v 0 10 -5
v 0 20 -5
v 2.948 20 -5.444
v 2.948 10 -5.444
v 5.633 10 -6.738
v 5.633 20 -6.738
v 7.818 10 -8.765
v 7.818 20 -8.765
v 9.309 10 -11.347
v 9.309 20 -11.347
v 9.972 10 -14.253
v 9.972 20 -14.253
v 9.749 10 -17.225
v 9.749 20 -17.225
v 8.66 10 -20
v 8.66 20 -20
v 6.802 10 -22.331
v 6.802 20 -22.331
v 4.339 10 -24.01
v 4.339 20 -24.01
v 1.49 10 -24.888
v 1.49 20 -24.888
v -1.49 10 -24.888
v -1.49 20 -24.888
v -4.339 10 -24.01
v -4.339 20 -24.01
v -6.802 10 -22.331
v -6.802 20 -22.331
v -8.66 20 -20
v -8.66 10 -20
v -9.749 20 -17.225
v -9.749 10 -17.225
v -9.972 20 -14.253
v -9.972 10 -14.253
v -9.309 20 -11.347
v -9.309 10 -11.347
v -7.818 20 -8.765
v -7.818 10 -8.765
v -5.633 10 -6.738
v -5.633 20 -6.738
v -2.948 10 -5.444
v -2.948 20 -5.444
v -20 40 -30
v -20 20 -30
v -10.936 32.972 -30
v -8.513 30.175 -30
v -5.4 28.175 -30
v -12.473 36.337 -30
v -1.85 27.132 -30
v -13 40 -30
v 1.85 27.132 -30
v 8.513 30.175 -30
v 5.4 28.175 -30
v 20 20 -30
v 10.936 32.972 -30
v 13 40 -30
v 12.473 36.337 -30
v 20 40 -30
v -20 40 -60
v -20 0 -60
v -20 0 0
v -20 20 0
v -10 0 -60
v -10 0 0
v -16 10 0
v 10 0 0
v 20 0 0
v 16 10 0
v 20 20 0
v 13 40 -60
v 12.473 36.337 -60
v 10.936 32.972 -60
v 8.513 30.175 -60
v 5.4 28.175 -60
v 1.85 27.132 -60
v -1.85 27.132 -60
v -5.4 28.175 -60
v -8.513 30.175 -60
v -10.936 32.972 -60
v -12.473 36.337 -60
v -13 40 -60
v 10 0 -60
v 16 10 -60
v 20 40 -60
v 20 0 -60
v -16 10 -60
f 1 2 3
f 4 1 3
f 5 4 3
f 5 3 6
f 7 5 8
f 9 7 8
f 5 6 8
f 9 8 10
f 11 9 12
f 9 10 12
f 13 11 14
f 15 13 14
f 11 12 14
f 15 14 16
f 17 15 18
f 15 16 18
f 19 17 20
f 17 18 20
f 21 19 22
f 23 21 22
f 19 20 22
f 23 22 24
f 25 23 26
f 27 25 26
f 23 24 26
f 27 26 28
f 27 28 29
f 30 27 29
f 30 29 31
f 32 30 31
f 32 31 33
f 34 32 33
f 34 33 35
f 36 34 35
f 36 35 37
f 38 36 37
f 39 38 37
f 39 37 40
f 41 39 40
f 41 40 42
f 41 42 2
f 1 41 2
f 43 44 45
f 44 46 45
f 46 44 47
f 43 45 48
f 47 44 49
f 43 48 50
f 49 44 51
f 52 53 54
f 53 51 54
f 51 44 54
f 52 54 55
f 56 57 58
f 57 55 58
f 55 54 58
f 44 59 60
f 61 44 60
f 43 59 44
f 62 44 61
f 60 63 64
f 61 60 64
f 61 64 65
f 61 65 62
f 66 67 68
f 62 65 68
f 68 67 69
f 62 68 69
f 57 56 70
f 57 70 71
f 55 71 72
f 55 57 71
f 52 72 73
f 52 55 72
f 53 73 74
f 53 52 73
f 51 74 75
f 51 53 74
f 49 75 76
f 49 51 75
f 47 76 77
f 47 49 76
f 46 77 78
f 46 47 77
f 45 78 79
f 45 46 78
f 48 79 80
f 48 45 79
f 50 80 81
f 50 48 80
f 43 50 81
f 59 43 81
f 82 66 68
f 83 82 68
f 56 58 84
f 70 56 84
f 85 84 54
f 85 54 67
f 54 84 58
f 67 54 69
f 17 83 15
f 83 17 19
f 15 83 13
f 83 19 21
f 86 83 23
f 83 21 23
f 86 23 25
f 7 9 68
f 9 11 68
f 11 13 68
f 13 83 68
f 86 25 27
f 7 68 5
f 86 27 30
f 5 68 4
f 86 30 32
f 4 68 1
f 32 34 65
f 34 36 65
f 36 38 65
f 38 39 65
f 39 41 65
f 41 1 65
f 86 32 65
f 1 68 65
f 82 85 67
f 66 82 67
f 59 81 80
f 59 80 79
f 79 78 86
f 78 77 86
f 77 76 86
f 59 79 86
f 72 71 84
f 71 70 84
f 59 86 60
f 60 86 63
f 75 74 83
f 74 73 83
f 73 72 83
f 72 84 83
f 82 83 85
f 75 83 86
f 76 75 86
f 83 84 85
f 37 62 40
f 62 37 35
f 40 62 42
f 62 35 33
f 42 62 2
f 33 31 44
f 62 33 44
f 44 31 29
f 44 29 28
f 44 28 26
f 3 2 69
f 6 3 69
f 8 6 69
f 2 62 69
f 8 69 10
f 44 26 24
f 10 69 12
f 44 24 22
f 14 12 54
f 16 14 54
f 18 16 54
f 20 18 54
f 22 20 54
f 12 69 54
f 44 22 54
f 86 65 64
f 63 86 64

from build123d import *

# Parameters (mm, degrees)
EXTRUDE_1_DEPTH     = 20
CUT_EXTRUDE_2_DEPTH = 75.833147735
SKETCH_3_R          = 10
CUT_EXTRUDE_3_DEPTH = 67.332495807
CUT_EXTRUDE_4_DEPTH = 54.851648071


with BuildPart() as part:
    # 草图1 → 凸台-拉伸1 (new, symmetric)
    with BuildSketch(Plane(origin=(0, 0, 0), x_dir=(0, 0, -1), z_dir=(1, 0, 0))):
        Polygon((0, 0), (0, 20), (30, 20), (30, 40), (60, 40), (60, 0), align=None)
    extrude(amount=EXTRUDE_1_DEPTH, both=True)

    # 草图2 → 切除-拉伸2 (cut, through all)
    with BuildSketch(Plane.XY):
        Polygon((10, 0), (16, 10), (-16, 10), (-10, 0), align=None)
    extrude(amount=-CUT_EXTRUDE_2_DEPTH, mode=Mode.SUBTRACT)

    # 草图3 → 切除-拉伸3 (cut, through all)
    with BuildSketch(Plane(origin=(0, 20, 0), x_dir=(1, 0, 0), z_dir=(0, 1, 0))):
        with Locations(Location((0, 15, 0), (0, 0, 270))):
            Circle(SKETCH_3_R)
    extrude(amount=-CUT_EXTRUDE_3_DEPTH, mode=Mode.SUBTRACT)

    # 草图4 → 切除-拉伸4 (cut, through all)
    with BuildSketch(Plane.XY.offset(-30)):
        with BuildLine():
            Line((-13, 40), (13, 40))
            ThreePointArc((13, 40), (0, 27), (-13, 40))
        make_face()
    extrude(amount=-CUT_EXTRUDE_4_DEPTH, mode=Mode.SUBTRACT)


solid = part.part
